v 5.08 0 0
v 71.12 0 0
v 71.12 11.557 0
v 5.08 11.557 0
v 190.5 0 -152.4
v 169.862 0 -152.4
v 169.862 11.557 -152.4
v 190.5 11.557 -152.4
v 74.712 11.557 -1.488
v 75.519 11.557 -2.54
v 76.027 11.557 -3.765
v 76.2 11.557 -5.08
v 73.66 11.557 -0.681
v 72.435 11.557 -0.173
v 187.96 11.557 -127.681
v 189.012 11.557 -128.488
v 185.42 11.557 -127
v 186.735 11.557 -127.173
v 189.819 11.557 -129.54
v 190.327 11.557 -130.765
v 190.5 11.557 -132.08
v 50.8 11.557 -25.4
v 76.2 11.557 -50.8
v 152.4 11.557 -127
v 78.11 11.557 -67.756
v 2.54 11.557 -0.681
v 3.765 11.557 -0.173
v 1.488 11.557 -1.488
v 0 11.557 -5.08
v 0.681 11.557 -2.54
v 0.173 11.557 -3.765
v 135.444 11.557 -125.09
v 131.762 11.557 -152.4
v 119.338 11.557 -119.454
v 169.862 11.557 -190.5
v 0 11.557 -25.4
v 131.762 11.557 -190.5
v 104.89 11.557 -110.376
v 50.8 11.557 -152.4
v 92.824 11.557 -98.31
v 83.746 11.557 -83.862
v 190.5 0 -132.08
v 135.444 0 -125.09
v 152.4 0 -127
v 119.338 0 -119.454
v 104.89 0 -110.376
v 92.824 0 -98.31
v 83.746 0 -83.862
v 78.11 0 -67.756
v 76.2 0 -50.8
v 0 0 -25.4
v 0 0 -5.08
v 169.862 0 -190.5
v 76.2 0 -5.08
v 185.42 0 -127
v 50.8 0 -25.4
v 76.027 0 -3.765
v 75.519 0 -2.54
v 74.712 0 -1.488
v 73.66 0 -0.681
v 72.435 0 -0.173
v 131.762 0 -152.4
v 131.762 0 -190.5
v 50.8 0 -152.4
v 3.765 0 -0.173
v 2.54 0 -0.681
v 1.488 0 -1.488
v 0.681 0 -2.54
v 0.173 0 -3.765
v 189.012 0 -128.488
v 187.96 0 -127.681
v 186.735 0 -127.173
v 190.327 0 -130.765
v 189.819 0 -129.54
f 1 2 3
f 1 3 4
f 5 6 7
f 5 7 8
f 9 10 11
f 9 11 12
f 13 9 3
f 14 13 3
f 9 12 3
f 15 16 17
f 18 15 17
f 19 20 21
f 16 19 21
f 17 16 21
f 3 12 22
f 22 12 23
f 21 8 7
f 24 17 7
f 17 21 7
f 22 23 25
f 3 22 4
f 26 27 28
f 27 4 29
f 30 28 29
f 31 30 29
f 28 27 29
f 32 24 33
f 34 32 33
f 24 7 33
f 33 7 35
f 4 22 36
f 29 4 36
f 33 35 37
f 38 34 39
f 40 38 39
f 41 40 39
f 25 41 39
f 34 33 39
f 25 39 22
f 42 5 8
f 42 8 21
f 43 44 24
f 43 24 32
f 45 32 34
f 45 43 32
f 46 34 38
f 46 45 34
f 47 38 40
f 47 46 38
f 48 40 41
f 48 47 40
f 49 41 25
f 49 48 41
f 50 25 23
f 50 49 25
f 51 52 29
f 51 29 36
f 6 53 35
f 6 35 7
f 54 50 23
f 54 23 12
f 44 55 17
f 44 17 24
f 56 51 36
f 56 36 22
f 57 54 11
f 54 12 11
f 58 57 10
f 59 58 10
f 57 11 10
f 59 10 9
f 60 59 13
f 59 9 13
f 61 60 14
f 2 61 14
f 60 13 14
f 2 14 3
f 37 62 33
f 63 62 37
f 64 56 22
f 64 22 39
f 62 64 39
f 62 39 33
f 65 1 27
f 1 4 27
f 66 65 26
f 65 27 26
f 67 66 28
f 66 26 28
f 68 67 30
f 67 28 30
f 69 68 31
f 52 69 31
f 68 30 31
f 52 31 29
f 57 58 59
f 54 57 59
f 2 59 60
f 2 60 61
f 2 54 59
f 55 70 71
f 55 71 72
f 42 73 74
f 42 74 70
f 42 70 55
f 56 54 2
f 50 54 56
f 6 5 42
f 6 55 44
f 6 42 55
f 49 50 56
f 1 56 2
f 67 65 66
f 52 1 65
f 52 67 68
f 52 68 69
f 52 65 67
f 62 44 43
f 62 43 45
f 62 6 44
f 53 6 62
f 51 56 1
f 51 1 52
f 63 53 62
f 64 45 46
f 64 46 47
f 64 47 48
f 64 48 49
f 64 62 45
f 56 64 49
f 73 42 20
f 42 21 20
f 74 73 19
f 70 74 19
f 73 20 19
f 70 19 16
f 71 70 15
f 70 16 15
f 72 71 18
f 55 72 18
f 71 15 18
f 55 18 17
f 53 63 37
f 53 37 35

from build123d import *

# Parameters (mm, degrees)
BOSS_EXTRUDE1_DEPTH = 11.557
FILLET1_R           = 5.08


with BuildPart() as part:
    # Sketch1 → Boss-Extrude1 (new body)
    with BuildSketch(Plane(origin=(0, 0, 0), x_dir=(1, 0, 0), z_dir=(0, 1, 0))):
        with BuildLine():
            Line((50.8, 25.4), (50.8, 152.4))
            Line((50.8, 152.4), (131.7625, 152.4))
            Line((131.7625, 152.4), (131.7625, 190.5))
            Line((131.7625, 190.5), (169.8625, 190.5))
            Line((169.8625, 190.5), (169.8625, 152.4))
            Line((169.8625, 152.4), (190.5, 152.4))
            Line((190.5, 152.4), (190.5, 127))
            Line((190.5, 127), (152.4, 127))
            ThreePointArc((152.4, 127), (98.518463274, 104.681536726), (76.2, 50.8))
            Line((76.2, 50.8), (76.2, 0))
            Line((76.2, 0), (0, 0))
            Line((0, 0), (0, 25.4))
            Line((0, 25.4), (50.8, 25.4))
        make_face()
    extrude(amount=BOSS_EXTRUDE1_DEPTH)

    # Fillet1
    fillet1_edges = [part.edges().sort_by_distance(p)[0] for p in [
        (190.5, 5.7785, -127),
        (76.2, 5.7785, 0),
        (0, 5.7785, 0),
    ]]
    fillet(fillet1_edges, radius=FILLET1_R)


solid = part.part
